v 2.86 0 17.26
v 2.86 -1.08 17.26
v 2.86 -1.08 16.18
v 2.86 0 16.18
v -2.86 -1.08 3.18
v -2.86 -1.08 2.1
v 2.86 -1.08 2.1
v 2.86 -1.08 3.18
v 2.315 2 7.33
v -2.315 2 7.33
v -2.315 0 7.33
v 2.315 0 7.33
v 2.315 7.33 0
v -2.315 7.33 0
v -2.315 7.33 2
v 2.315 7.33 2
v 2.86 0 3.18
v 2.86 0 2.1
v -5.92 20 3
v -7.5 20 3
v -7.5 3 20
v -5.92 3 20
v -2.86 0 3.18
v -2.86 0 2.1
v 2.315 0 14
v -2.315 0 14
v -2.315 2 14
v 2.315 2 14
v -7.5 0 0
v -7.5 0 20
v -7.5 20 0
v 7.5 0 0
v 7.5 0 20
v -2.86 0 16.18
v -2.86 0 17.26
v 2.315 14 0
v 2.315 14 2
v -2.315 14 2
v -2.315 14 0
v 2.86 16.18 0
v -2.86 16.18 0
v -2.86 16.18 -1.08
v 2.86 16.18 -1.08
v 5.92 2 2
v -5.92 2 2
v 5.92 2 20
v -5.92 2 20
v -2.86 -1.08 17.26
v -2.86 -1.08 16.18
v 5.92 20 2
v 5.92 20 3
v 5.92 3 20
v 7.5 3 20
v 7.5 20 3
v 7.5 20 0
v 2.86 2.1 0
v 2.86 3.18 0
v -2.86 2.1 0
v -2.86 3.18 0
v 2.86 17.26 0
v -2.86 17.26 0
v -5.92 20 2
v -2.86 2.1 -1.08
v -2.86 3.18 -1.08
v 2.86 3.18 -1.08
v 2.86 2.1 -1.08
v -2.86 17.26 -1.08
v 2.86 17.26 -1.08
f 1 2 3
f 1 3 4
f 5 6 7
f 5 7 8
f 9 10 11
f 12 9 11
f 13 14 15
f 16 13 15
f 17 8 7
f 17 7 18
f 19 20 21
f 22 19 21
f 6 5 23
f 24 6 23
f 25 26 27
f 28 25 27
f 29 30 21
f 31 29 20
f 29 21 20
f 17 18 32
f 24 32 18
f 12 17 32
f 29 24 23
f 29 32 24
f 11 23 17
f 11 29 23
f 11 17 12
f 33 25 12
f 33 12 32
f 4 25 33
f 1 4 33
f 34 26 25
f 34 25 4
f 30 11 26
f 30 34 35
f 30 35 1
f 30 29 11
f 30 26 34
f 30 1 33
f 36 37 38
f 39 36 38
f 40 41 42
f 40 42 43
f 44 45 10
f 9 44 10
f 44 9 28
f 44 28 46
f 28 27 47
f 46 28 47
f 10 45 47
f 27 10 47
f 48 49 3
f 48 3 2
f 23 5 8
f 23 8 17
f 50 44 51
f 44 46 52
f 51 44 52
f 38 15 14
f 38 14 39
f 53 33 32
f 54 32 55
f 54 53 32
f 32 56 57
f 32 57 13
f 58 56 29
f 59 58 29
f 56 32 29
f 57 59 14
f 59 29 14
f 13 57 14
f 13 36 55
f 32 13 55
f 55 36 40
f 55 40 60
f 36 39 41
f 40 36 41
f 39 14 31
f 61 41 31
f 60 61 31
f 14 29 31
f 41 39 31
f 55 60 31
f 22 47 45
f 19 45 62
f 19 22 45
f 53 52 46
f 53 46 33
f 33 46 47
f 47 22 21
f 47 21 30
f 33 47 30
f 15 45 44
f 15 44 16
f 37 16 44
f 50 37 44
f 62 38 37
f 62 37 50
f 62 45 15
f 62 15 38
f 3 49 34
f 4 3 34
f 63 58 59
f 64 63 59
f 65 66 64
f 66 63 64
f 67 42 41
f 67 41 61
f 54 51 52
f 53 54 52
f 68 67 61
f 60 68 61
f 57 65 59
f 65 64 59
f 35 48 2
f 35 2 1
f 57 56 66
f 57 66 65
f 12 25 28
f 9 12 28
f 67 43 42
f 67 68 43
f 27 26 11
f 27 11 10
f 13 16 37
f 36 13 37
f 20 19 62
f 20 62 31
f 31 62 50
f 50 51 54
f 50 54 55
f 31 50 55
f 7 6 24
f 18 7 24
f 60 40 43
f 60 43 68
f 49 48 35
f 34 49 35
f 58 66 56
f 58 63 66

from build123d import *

# Parameters (mm, degrees)
BOSS_EXTRUDE2_DEPTH     = 7.5
CAVITY_START            = 2
SKETCH3_W               = 5.92
SKETCH3_H               = 9.5
CAVITY_DEPTH            = 23.259018941
SLOT_CUT_REACH          = 26.259
SQUARE_START            = -2
SKETCH8_W               = 2.315
SKETCH8_H               = 6.67
SQUARE_SLOT_DEPTH       = 2
BOSS_EXTRUDE3_DEPTH     = 0.8
SKETCH9_W               = 2.86
SKETCH9_H               = 1.08
SQUARE_RAILS_DEPTH      = 1.08
HALF_START              = 5.92
HALF_MIRROR_DEPTH       = 1.58
HALF_MIRROR_2_OUTLINE_W = 6
HALF_MIRROR_2_OUTLINE_H = 2
HALF_MIRROR_2_DEPTH     = 5.92
HALF_START_2            = 2.315
HALF_MIRROR_3_OUTLINE_W = 6.67
HALF_MIRROR_3_OUTLINE_H = 2
HALF_MIRROR_3_DEPTH     = 3.605
HALF_MIRROR_4_OUTLINE_W = 1.08
HALF_MIRROR_4_OUTLINE_H = 1.08
HALF_MIRROR_4_DEPTH     = 2.86
FULL_START              = -7.5
FULL_MIRROR_OUTLINE_W   = 2
FULL_MIRROR_OUTLINE_H   = 6
FULL_MIRROR_DEPTH       = 15
FULL_MIRROR_2_DEPTH     = 1.58
FULL_START_2            = 5.92
FULL_MIRROR_3_DEPTH     = 1.58
FULL_START_3            = -5.92
FULL_MIRROR_4_OUTLINE_W = 2
FULL_MIRROR_4_OUTLINE_H = 6.67
FULL_MIRROR_4_DEPTH     = 3.605
FULL_START_4            = 2.315
FULL_MIRROR_5_OUTLINE_W = 2
FULL_MIRROR_5_OUTLINE_H = 6.67
FULL_MIRROR_5_DEPTH     = 3.605
FULL_START_5            = -2.86
FULL_MIRROR_6_OUTLINE_W = 1.08
FULL_MIRROR_6_OUTLINE_H = 1.08
FULL_MIRROR_6_DEPTH     = 5.72


# Read off the part's stored shape, not the designer's step: Half mirror, Full mirror
with BuildPart() as part:
    # Sketch2 → Boss-Extrude2 (new body)
    with BuildSketch(Plane(origin=(0, 0, 0), x_dir=(0, 0, -1), z_dir=(1, 0, 0))):
        Polygon((-11.5, 11.5), (-3, 20), (0, 20), (0, 0), align=None)
    extrude(amount=-BOSS_EXTRUDE2_DEPTH)

    # Sketch3 → Cavity (cut, through all)
    with BuildSketch(Plane(origin=(0, 0, 0), x_dir=(1, 0, 0), z_dir=(0, 1, 0)).offset(CAVITY_START)):
        with Locations((-2.96, -6.75)):
            Rectangle(SKETCH3_W, SKETCH3_H)
    extrude(amount=CAVITY_DEPTH, mode=Mode.SUBTRACT)

    # Sketch4 → Slot cut (cut, up to next)
    with BuildSketch(Plane.XY, mode=Mode.PRIVATE) as slot_cut_sk1:
        with BuildLine():
            Line((0, 7.33), (-0.015, 7.33))
            ThreePointArc((-0.015, 7.33), (-1.641345597, 8.003654403), (-2.315, 9.63))
            Line((-2.315, 9.63), (-2.315, 11.7))
            ThreePointArc((-2.315, 11.7), (-1.641345597, 13.326345597), (-0.015, 14))
            Line((-0.015, 14), (0, 14))
            Line((0, 14), (0, 7.33))
        make_face()
    slot_cut_tool1 = extrude(slot_cut_sk1.sketch, amount=SLOT_CUT_REACH, mode=Mode.PRIVATE) & part.part
    add(slot_cut_tool1.solids().sort_by_distance((-1.046523, 10.665, 0))[0], mode=Mode.SUBTRACT)

    # Sketch8 → Square slot (cut)
    with BuildSketch(Plane(origin=(0, 0, 0), x_dir=(-1, 0, 0), z_dir=(0, 0, -1)).offset(SQUARE_START)):
        with Locations((1.1575, 10.665)):
            Rectangle(SKETCH8_W, SKETCH8_H)
    extrude(amount=SQUARE_SLOT_DEPTH, mode=Mode.SUBTRACT)

    # Sketch6 → Boss-Extrude3 (add)
    with BuildSketch(Plane(origin=(0, 0, 0), x_dir=(-1, 0, 0), z_dir=(0, 0, -1))):
        with BuildLine():
            Line((0, 3.18), (2.33, 3.18))
            ThreePointArc((2.33, 3.18), (2.704766594, 3.024766594), (2.86, 2.65))
            Line((2.86, 2.65), (2.86, 2.63))
            ThreePointArc((2.86, 2.63), (2.704766594, 2.255233406), (2.33, 2.1))
            Line((2.33, 2.1), (0, 2.1))
            Line((0, 2.1), (0, 3.18))
        make_face()
        with BuildLine():
            Line((0, 17.26), (2.33, 17.26))
            ThreePointArc((2.33, 17.26), (2.704766594, 17.104766594), (2.86, 16.73))
            Line((2.86, 16.73), (2.86, 16.71))
            ThreePointArc((2.86, 16.71), (2.704766594, 16.335233406), (2.33, 16.18))
            Line((2.33, 16.18), (0, 16.18))
            Line((0, 16.18), (0, 17.26))
        make_face()
    extrude(amount=BOSS_EXTRUDE3_DEPTH)

    # Sketch9 → Square rails (add)
    with BuildSketch(Plane(origin=(0, 0, 0), x_dir=(-1, 0, 0), z_dir=(0, 0, -1))):
        with Locations((1.43, 16.72)):
            Rectangle(SKETCH9_W, SKETCH9_H)
        with Locations((1.43, 2.64)):
            Rectangle(SKETCH9_W, SKETCH9_H)
    extrude(amount=SQUARE_RAILS_DEPTH)



with BuildPart() as body_2:
    # Half mirror outline → Half mirror (new body)
    with BuildSketch(Plane.YZ.offset(HALF_START)):
        Polygon((0, 0), (20, 0), (20, 3), (11.5, 11.5), align=None)
    extrude(amount=HALF_MIRROR_DEPTH)


with BuildPart() as part_1:
    add(part.part)

    add(body_2.part)  # Half mirror 2 merges body 2
    # Half mirror 2 outline → Half mirror 2 (add)
    with BuildSketch(Plane.YZ):
        Polygon((2, 2), (0, 0), (7.33, 0), (7.33, 2), align=None)
        with Locations((17, 1)):
            Rectangle(HALF_MIRROR_2_OUTLINE_W, HALF_MIRROR_2_OUTLINE_H)
    extrude(amount=HALF_MIRROR_2_DEPTH)

    # Half mirror 3 outline → Half mirror 3 (add)
    with BuildSketch(Plane.YZ.offset(HALF_START_2)):
        with Locations((10.665, 1)):
            Rectangle(HALF_MIRROR_3_OUTLINE_W, HALF_MIRROR_3_OUTLINE_H)
    extrude(amount=HALF_MIRROR_3_DEPTH)

    # Half mirror 4 outline → Half mirror 4 (add)
    with BuildSketch(Plane.YZ):
        with Locations((2.64, -0.54)):
            Rectangle(HALF_MIRROR_4_OUTLINE_W, HALF_MIRROR_4_OUTLINE_H)
        with Locations((16.72, -0.54)):
            Rectangle(HALF_MIRROR_4_OUTLINE_W, HALF_MIRROR_4_OUTLINE_H)
    extrude(amount=HALF_MIRROR_4_DEPTH)

    # Full mirror outline → Full mirror (add)
    with BuildSketch(Plane.YZ.offset(FULL_START)):
        Polygon((0, 7.33), (0, 0), (2, 2), (2, 7.33), align=None)
        with Locations((1, 17)):
            Rectangle(FULL_MIRROR_OUTLINE_W, FULL_MIRROR_OUTLINE_H)
    extrude(amount=FULL_MIRROR_DEPTH)

    # Full mirror 2 outline → Full mirror 2 (add)
    with BuildSketch(Plane.YZ.offset(FULL_START)):
        Polygon((2, 7.33), (2, 2), (11.5, 11.5), (3, 20), (2, 20), (2, 14), (0, 14), (0, 7.33), align=None)
    extrude(amount=FULL_MIRROR_2_DEPTH)

    # Full mirror 3 outline → Full mirror 3 (add)
    with BuildSketch(Plane.YZ.offset(FULL_START_2)):
        Polygon((2, 7.33), (2, 2), (11.5, 11.5), (3, 20), (2, 20), (2, 14), (0, 14), (0, 7.33), align=None)
    extrude(amount=FULL_MIRROR_3_DEPTH)

    # Full mirror 4 outline → Full mirror 4 (add)
    with BuildSketch(Plane.YZ.offset(FULL_START_3)):
        with Locations((1, 10.665)):
            Rectangle(FULL_MIRROR_4_OUTLINE_W, FULL_MIRROR_4_OUTLINE_H)
    extrude(amount=FULL_MIRROR_4_DEPTH)

    # Full mirror 5 outline → Full mirror 5 (add)
    with BuildSketch(Plane.YZ.offset(FULL_START_4)):
        with Locations((1, 10.665)):
            Rectangle(FULL_MIRROR_5_OUTLINE_W, FULL_MIRROR_5_OUTLINE_H)
    extrude(amount=FULL_MIRROR_5_DEPTH)

    # Full mirror 6 outline → Full mirror 6 (add)
    with BuildSketch(Plane.YZ.offset(FULL_START_5)):
        with Locations((-0.54, 2.64)):
            Rectangle(FULL_MIRROR_6_OUTLINE_W, FULL_MIRROR_6_OUTLINE_H)
        with Locations((-0.54, 16.72)):
            Rectangle(FULL_MIRROR_6_OUTLINE_W, FULL_MIRROR_6_OUTLINE_H)
    extrude(amount=FULL_MIRROR_6_DEPTH)


solid = part_1.part
